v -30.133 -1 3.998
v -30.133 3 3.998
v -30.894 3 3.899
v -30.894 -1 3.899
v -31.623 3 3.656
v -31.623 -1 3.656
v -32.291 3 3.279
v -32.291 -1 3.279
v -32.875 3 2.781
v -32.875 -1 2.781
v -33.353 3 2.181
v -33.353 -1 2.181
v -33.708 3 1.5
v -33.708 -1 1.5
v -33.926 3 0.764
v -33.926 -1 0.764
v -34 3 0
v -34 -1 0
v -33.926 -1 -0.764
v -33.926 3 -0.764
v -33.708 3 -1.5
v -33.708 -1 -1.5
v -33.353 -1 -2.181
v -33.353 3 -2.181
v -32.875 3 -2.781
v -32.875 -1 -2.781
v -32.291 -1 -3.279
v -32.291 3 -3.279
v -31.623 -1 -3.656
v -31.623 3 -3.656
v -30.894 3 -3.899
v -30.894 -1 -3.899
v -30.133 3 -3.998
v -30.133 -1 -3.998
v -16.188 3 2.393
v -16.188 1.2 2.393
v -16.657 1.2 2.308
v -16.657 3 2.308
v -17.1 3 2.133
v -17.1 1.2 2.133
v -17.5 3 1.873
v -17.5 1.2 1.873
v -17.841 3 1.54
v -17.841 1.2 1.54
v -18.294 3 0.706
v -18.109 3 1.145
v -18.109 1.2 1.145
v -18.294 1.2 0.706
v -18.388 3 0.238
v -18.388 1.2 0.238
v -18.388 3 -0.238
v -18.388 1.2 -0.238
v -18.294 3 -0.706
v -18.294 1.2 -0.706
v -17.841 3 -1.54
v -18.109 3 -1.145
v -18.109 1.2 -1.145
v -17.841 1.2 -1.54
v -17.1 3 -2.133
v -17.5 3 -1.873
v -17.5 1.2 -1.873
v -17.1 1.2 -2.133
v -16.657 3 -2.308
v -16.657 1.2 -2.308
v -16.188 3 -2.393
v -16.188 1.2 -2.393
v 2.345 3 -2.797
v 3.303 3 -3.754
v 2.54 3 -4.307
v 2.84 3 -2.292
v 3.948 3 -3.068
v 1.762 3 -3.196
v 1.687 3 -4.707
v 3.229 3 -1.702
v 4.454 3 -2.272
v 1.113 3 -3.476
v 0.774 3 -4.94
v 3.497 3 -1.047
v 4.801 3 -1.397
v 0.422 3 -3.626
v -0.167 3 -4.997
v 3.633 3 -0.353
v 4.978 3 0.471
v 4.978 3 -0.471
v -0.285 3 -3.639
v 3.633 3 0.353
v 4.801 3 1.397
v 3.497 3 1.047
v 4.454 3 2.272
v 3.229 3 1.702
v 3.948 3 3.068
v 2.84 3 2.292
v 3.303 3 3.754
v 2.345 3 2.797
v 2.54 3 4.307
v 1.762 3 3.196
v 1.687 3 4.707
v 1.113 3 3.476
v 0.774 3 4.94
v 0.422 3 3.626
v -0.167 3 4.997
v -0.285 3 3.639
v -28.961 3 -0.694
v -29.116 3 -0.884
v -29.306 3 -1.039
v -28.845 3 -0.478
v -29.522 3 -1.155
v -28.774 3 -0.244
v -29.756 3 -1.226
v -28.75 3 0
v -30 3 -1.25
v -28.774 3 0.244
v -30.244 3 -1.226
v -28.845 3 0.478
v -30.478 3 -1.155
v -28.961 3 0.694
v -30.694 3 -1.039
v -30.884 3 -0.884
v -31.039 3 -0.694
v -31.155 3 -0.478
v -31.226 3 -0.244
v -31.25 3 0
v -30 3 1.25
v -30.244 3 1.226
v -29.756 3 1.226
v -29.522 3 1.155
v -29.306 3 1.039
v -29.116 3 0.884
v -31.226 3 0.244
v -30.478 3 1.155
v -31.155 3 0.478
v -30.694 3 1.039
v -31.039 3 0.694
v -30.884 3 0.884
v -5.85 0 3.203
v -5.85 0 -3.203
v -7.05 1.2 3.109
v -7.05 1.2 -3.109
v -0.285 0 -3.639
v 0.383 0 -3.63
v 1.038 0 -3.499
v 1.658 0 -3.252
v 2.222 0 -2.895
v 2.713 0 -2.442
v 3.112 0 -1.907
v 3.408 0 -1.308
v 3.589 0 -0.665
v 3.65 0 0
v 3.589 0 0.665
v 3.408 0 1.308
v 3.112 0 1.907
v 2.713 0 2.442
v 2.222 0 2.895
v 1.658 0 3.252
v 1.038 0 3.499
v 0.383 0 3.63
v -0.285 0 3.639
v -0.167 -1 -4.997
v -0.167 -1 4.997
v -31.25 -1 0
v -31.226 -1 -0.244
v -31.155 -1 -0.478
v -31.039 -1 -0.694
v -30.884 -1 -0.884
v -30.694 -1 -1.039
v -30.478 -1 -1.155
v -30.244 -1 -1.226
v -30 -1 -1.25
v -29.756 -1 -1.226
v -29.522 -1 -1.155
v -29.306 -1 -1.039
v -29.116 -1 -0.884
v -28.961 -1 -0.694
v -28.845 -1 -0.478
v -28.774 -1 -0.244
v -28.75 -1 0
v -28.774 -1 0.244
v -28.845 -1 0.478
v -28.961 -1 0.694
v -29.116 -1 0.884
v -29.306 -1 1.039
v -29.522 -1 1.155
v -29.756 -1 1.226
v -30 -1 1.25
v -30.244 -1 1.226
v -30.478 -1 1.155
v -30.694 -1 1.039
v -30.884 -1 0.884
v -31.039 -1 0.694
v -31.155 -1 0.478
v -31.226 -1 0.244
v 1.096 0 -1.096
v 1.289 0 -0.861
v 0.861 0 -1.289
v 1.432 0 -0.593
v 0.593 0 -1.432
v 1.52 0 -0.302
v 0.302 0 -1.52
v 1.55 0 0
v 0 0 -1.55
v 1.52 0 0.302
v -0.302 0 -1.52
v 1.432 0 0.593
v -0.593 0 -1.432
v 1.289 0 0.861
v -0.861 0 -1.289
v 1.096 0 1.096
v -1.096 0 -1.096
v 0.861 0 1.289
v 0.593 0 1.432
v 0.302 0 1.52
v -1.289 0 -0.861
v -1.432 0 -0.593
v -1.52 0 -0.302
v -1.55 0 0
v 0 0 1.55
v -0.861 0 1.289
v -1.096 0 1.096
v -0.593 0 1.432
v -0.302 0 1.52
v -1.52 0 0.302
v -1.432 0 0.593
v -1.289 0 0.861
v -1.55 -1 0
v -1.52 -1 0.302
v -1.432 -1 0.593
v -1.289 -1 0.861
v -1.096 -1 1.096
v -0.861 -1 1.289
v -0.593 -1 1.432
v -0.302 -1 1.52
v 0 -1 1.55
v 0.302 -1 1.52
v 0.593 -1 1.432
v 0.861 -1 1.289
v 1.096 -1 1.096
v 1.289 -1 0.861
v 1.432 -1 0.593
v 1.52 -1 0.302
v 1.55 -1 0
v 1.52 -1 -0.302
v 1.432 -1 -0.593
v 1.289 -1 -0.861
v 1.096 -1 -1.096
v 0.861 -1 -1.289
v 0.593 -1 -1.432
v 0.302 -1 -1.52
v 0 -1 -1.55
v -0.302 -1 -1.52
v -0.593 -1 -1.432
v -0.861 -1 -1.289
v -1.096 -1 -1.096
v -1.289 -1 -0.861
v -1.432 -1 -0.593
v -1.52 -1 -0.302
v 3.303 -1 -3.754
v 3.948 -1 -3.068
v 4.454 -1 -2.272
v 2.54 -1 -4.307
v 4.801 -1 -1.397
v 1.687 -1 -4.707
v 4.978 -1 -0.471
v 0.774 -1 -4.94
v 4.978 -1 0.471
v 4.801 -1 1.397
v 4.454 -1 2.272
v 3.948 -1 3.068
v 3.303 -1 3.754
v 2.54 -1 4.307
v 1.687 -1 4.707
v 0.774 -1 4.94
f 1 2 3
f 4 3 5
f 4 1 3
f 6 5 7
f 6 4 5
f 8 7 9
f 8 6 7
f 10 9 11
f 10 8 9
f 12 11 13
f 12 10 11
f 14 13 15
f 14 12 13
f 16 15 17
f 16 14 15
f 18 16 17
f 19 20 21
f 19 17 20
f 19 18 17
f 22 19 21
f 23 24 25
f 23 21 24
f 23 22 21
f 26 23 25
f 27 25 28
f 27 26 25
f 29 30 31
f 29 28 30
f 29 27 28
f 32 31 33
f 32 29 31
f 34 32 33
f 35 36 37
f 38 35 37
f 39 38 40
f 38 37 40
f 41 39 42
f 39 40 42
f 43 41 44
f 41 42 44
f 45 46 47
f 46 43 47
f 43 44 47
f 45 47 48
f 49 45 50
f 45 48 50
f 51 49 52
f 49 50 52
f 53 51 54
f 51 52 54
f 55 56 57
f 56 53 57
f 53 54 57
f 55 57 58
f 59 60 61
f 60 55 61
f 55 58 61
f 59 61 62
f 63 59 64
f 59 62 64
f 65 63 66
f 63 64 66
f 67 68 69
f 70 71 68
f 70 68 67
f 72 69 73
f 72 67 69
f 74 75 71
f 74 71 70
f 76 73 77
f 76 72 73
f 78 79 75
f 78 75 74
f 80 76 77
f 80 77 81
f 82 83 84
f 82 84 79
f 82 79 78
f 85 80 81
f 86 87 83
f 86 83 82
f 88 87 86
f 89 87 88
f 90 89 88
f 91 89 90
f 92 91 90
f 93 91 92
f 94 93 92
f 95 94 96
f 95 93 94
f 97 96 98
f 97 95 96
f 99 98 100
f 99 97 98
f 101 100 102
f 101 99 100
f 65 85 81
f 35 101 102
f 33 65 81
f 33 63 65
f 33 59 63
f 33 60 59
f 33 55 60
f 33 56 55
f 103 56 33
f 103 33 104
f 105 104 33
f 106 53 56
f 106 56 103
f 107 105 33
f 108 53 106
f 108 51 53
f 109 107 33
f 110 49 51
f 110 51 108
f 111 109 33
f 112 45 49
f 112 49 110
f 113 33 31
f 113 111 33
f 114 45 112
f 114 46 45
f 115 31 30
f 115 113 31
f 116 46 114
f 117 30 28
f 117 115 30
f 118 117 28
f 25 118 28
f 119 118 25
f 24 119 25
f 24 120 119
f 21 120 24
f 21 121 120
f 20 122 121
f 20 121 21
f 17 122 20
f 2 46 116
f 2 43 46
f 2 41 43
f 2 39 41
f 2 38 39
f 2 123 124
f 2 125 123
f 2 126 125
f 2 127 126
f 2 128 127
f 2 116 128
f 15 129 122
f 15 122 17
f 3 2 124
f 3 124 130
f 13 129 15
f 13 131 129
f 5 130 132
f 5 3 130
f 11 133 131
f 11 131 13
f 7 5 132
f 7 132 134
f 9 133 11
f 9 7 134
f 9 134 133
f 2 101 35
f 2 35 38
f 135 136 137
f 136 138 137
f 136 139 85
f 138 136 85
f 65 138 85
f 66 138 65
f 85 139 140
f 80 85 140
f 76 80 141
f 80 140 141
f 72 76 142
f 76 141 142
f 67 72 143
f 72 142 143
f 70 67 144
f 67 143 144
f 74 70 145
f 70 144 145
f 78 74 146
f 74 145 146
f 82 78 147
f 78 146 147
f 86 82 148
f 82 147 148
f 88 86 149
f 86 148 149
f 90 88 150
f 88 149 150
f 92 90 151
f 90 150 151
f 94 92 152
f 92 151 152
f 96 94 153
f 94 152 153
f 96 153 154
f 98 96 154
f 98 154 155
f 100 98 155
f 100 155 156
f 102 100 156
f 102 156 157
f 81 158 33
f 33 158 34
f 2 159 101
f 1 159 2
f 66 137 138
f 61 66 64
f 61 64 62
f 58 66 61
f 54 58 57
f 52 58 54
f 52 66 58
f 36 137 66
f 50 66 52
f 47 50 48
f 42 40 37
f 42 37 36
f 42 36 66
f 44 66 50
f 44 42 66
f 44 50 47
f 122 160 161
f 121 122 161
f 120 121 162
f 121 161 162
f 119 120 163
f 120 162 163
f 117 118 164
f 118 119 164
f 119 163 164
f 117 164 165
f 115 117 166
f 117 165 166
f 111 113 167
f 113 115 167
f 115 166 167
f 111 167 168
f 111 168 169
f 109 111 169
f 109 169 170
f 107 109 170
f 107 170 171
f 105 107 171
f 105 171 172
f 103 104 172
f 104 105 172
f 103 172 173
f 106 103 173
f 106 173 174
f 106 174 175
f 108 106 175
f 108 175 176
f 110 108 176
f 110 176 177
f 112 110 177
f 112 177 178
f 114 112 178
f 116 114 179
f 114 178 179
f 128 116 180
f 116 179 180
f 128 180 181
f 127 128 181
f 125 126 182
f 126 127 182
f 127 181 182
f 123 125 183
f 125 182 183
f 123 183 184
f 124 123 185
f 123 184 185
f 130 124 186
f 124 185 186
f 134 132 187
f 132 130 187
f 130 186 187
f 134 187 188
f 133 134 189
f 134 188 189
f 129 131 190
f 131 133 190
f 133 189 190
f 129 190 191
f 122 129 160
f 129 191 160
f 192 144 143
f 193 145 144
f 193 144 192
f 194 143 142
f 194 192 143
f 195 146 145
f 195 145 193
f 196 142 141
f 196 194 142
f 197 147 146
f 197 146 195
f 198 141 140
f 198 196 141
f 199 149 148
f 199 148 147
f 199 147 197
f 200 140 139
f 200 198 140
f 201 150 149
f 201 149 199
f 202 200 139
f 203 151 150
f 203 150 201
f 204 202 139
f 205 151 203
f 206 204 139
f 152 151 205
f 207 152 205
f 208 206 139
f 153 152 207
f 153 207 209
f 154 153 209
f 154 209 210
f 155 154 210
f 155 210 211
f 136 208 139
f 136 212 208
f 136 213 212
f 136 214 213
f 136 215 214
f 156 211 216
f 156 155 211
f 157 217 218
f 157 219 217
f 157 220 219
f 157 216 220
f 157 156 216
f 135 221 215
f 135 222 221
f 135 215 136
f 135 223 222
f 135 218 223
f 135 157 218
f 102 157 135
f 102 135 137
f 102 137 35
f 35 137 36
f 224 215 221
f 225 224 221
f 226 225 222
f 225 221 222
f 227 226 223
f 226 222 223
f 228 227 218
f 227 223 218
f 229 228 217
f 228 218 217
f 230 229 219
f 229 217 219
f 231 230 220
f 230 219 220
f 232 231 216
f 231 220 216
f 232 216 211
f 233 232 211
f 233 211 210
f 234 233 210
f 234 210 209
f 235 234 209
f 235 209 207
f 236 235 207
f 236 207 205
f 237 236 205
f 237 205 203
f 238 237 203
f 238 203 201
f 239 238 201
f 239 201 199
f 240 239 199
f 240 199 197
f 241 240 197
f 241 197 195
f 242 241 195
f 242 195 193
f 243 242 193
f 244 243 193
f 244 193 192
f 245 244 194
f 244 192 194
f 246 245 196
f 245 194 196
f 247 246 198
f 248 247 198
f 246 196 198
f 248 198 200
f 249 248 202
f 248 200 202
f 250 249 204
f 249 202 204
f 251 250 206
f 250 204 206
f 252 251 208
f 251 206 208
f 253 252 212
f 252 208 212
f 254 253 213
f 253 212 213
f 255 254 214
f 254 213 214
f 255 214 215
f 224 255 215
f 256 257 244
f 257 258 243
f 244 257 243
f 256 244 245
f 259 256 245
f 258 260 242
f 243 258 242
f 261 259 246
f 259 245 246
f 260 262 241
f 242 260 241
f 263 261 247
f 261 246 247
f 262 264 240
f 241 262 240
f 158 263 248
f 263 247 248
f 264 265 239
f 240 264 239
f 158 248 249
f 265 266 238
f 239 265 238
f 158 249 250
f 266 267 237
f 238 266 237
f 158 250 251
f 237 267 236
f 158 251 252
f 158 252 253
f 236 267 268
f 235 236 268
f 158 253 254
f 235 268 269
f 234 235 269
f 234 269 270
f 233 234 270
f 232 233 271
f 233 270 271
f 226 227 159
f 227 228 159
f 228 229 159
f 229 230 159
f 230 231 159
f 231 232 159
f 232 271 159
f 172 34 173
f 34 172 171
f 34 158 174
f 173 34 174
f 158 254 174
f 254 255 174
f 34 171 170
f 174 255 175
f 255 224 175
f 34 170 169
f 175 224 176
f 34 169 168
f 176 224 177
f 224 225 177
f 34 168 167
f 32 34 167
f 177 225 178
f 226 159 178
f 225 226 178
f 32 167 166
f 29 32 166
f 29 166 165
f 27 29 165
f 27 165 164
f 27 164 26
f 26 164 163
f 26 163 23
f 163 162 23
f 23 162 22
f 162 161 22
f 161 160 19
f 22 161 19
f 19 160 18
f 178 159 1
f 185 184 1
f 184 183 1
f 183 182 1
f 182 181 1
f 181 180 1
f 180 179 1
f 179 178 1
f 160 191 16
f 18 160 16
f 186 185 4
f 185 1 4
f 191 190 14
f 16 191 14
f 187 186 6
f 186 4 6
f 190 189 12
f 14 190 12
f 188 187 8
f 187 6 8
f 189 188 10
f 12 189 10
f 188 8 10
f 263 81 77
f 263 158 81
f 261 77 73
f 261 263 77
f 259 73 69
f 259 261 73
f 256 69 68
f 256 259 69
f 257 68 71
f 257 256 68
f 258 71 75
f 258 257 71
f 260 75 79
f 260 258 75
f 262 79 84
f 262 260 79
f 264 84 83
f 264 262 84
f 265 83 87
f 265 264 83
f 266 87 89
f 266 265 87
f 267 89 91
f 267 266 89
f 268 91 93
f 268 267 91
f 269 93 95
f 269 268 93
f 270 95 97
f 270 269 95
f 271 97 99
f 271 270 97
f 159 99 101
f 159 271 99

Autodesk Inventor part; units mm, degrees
ref_plane "YZ Plane" through (0, 0, 0) normal (1, 0, 0) x (0, 1, 0)
ref_plane "XZ Plane" through (0, 0, 0) normal (0, 1, 0) x (-1, 0, 0)
ref_plane "XY Plane" through (0, 0, 0) normal (0, 0, 1) x (1, 0, 0)
sketch "Sketch1" plane through (0, 0, 0) normal (0, 1, 0) x (-1, 0, 0)
  arc A0 (0.2852, 3.6388) -> (0.2852, -3.6388) centre (0, 0) ccw
  line L0 (0, 0) -> (16, 0) construction
  arc A1 (16.1875, -2.3927) -> (16.1875, 2.3927) centre (16, 0) ccw
  line L1 (0.2852, 3.6388) -> (16.1875, 2.3927)
  line L2 (0.2852, -3.6388) -> (16.1875, -2.3927)
  line L3 (5.85, 3.2028) -> (5.85, -3.2028)
  line L4 (0, 0) -> (-3.65, 0)
  circle A2 centre (0, 0) radius 1.55
  circle A3 centre (0, 0) radius 3
  circle A4 centre (0, 0) radius 5
  line L5 (0.1667, 4.9972) -> (30.1333, 3.9978)
  line L6 (0.1667, -4.9972) -> (30.1333, -3.9978)
  circle A5 centre (30, 0) radius 4
  line L7 (16, 0) -> (30, 0) construction
  circle A6 centre (30, 0) radius 1.25
  point P0 (0, 0)
  dimension "d0" = 7.3
  dimension "d1" = 4.8
  dimension "d2" = 16
  dimension "d3" = 9.5
  dimension "d4" = 3.1
  dimension "d6" = 6
  dimension "d8" = 2.5
  dimension "d18" = 10
  dimension "d19" = 8
  dimension "d20" = 30
extrude "Extrusion1" add sketch "Sketch1" against normal blind 1 contours A3 | L1 A4 L2 A0 | A0 L2 A4 L1 | A4 L5 A5 L6 L2 A1 L1 | L1 L3 L2 A4 | L1 A1 L2 L3 | A5
extrude "Extrusion2" add sketch "Sketch1" along normal blind 3 contours A0 L2 A4 L1 | A4 L5 A5 L6 L2 A1 L1 | A5 picked at (2.3095, 3.6823)
extrude "Extrusion3" add sketch "Sketch1" along normal blind 1.2 contours L1 A1 L2 L3
chamfer "Chamfer1" distance 1.2 angle 45 1 edges at (-5.85, 1.2, 0)
properties part number "Servo Arm_3DPrint"
